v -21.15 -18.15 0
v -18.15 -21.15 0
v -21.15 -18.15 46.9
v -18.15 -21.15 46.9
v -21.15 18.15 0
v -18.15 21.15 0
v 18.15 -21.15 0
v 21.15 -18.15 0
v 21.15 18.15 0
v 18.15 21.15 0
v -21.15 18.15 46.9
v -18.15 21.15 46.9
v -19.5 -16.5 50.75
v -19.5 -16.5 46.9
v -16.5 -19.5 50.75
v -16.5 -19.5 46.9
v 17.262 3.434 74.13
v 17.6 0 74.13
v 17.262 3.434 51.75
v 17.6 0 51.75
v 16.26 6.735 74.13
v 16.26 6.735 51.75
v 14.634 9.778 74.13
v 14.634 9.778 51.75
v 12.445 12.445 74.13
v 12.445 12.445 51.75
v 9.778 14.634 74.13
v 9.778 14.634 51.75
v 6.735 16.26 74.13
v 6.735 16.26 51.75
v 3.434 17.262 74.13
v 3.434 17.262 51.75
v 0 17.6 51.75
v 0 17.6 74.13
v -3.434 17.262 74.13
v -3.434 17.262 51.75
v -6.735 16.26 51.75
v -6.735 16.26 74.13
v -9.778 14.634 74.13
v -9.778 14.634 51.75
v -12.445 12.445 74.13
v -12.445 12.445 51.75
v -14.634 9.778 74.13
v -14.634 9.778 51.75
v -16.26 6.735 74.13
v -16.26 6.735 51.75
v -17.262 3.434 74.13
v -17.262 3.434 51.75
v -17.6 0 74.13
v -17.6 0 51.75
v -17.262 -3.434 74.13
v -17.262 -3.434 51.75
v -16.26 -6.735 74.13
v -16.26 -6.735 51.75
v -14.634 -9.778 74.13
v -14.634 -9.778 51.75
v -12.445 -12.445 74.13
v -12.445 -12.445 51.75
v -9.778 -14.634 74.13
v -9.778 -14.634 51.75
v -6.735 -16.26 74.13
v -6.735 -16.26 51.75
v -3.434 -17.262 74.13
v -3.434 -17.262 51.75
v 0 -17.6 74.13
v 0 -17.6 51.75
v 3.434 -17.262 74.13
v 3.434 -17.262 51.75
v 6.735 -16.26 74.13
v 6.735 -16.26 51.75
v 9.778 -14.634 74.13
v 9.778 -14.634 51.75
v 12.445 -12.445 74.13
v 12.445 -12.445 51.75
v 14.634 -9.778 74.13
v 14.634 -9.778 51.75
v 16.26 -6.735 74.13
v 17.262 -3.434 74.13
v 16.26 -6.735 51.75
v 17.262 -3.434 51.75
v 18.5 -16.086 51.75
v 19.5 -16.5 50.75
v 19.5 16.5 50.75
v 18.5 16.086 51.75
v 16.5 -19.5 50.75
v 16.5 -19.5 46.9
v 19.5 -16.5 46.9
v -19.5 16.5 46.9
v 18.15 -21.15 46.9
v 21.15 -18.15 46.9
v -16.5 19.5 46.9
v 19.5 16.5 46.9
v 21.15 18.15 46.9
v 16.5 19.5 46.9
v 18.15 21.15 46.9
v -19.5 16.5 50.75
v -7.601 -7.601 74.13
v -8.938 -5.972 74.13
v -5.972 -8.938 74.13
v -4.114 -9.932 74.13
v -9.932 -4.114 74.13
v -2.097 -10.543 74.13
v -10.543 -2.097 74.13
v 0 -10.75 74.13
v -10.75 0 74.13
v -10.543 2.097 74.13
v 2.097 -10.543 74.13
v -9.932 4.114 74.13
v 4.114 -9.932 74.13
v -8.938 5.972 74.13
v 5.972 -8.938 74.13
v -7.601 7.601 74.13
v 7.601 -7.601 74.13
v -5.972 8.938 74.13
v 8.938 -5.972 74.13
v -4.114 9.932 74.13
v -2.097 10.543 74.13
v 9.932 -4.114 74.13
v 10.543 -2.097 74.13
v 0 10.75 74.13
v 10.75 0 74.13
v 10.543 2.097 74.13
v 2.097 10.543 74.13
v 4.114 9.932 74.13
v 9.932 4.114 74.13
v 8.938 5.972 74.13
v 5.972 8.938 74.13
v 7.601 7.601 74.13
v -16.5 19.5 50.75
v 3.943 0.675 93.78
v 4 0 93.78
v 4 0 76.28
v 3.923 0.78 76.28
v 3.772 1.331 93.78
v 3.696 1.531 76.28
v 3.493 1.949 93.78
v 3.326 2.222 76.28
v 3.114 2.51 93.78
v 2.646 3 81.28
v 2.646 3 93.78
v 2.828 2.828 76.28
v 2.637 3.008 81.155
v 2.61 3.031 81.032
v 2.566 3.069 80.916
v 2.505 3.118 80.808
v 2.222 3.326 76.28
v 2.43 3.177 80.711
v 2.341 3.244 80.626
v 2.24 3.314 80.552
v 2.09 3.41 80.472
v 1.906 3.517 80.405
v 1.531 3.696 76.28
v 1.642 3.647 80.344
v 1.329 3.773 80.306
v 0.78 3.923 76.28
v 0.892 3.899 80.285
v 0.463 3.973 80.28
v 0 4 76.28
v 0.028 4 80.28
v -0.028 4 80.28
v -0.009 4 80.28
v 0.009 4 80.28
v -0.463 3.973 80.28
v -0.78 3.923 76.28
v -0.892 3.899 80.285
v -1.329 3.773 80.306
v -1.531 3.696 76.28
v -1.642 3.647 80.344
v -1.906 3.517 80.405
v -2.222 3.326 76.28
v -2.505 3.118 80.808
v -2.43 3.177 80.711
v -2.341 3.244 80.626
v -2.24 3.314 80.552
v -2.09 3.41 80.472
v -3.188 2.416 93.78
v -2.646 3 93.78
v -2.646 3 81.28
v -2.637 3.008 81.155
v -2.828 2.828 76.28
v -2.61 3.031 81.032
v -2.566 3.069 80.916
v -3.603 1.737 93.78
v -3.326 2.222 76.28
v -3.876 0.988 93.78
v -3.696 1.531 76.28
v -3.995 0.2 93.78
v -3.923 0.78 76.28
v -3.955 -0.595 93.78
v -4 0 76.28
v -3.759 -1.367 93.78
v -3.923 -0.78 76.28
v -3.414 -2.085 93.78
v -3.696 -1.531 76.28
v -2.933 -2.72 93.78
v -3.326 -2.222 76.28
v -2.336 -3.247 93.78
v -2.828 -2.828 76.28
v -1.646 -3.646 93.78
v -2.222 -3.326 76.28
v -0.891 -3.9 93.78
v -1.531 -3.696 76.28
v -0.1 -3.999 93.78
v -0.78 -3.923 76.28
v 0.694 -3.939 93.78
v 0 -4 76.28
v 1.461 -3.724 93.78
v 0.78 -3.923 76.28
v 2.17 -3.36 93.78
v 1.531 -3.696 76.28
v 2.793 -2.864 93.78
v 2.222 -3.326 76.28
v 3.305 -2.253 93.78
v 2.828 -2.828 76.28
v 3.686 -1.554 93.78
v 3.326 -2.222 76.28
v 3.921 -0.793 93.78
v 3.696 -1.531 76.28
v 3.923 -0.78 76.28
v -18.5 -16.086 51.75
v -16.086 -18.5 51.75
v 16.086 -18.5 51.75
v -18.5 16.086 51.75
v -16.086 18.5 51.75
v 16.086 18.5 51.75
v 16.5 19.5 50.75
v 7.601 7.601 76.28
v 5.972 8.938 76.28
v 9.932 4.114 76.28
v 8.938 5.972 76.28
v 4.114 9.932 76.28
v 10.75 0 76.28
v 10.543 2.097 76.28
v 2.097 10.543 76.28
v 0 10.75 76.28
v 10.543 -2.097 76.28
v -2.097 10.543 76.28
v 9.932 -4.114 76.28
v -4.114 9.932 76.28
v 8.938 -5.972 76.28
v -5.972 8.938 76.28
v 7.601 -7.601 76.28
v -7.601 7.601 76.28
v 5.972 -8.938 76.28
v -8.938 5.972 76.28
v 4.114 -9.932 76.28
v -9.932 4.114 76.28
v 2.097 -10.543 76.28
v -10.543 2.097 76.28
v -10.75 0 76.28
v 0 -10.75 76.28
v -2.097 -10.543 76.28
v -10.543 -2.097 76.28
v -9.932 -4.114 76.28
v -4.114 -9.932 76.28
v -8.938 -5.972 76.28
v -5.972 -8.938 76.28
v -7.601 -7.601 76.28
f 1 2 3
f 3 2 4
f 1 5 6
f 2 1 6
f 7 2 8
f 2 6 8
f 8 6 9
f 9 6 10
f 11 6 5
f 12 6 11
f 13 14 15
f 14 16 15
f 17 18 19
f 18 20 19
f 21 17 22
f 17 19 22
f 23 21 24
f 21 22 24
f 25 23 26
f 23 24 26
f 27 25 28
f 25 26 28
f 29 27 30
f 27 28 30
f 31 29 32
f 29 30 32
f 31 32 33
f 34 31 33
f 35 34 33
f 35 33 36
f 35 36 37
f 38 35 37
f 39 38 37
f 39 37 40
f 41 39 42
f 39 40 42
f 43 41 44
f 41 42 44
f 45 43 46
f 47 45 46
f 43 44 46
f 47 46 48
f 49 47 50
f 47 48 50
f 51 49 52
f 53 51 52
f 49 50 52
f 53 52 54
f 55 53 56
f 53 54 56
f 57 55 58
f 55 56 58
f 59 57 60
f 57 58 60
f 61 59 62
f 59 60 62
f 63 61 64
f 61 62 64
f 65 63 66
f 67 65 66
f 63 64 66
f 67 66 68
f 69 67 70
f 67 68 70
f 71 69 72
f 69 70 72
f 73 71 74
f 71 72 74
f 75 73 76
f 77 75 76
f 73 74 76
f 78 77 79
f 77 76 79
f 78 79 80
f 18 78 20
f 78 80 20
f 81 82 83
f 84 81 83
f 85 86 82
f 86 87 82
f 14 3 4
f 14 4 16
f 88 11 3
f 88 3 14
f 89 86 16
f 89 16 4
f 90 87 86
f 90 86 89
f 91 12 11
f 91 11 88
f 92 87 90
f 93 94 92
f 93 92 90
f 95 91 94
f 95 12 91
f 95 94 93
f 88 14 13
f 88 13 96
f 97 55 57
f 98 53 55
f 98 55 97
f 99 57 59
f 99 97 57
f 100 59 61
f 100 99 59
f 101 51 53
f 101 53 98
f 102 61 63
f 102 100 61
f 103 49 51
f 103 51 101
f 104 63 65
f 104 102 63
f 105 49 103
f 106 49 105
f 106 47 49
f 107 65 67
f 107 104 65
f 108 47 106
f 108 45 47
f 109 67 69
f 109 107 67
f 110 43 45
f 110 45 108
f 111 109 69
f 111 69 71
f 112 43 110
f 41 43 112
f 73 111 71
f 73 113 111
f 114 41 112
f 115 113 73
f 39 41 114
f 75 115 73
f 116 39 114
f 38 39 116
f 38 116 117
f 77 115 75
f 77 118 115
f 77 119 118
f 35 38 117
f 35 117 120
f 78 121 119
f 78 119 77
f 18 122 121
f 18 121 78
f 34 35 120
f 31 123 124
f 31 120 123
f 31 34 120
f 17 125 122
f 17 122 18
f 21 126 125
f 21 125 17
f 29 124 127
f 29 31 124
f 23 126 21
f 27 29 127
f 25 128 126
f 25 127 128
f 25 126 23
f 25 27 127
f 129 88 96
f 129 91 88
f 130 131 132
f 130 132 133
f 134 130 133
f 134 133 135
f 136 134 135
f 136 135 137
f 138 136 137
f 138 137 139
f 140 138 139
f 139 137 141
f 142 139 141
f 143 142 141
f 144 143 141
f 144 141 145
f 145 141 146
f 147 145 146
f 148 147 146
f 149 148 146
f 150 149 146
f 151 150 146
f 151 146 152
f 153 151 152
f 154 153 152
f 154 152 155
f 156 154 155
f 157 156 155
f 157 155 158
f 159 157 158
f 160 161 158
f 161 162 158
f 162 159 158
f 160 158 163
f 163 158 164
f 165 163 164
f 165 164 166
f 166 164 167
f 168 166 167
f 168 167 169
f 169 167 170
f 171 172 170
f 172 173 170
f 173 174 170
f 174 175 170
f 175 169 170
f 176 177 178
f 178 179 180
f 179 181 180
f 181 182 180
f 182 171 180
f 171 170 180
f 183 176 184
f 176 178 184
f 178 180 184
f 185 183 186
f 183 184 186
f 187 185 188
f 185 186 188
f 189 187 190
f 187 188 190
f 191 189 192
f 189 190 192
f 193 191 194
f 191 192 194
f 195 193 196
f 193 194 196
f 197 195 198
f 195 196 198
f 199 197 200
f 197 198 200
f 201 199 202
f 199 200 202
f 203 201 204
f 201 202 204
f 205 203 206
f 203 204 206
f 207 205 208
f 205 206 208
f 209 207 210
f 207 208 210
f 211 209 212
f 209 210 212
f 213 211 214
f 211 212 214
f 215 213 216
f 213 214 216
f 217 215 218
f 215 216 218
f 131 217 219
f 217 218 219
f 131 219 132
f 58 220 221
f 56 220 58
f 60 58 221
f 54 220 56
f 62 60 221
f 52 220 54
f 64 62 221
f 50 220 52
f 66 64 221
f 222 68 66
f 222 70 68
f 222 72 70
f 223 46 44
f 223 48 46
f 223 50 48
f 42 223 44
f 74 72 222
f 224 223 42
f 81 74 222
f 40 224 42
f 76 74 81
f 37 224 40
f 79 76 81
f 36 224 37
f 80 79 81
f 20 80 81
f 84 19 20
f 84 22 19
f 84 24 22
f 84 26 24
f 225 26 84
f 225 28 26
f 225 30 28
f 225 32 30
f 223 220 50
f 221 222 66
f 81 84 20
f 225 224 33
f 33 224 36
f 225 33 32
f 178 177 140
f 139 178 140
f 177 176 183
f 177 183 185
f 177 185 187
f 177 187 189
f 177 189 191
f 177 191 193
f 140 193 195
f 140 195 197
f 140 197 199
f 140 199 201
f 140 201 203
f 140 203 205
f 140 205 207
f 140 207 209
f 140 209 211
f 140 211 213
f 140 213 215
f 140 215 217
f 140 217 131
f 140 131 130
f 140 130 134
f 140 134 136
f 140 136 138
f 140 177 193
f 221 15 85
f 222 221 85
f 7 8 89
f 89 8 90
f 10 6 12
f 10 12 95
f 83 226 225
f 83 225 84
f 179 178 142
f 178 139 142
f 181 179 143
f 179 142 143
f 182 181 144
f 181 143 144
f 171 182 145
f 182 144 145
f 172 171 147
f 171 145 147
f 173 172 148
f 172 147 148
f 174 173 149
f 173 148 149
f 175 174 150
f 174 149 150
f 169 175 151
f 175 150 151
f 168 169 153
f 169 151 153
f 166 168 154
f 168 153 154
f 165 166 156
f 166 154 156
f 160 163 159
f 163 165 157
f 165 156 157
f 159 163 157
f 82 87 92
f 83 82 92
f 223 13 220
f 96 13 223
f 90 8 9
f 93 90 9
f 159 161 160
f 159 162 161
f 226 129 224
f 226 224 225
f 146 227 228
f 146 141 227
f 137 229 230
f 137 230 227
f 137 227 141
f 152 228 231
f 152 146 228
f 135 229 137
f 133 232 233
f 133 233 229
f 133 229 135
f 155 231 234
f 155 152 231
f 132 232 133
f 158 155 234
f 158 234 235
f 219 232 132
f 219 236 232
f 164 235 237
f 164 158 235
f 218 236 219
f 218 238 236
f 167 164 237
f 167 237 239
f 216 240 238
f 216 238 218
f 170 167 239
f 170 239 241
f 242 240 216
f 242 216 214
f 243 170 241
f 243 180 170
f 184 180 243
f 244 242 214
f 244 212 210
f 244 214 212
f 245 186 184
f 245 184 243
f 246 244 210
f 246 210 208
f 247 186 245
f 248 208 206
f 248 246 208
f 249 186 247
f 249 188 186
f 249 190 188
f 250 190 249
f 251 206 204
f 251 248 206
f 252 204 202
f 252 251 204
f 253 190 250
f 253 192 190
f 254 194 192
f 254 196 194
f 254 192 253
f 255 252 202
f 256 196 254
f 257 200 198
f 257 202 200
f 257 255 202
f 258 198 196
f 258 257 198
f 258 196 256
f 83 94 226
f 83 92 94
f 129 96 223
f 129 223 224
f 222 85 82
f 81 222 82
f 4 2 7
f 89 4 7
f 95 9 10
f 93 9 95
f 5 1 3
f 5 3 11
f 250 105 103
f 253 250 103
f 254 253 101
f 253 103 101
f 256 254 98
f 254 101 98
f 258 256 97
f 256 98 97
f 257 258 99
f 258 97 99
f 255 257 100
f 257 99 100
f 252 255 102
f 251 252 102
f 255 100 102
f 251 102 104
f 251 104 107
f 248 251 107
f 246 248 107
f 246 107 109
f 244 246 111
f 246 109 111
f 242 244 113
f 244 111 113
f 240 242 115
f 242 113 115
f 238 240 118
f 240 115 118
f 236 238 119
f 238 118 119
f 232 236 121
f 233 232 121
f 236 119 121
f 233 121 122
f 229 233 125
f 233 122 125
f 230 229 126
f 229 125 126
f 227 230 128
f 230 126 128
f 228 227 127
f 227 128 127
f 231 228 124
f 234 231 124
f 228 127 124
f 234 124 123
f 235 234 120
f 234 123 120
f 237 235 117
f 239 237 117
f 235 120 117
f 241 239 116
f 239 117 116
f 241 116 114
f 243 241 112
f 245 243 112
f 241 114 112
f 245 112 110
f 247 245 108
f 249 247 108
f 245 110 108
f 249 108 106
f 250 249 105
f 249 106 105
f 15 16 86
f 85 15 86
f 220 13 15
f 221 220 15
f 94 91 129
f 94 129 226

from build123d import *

# Parameters (mm, degrees)
SKETCH1_W           = 42.3
SKETCH1_H           = 42.3
BOSS_EXTRUDE1_DEPTH = 46.9
SKETCH2_W           = 39
SKETCH2_H           = 39
BOSS_EXTRUDE2_DEPTH = 4.85
SKETCH3_R           = 17.6
BOSS_EXTRUDE3_DEPTH = 15.88
SKETCH4_R           = 17.6
BOSS_EXTRUDE4_DEPTH = 6.5
SKETCH5_R           = 10.75
BOSS_EXTRUDE5_DEPTH = 2.15
SKETCH6_R           = 4
BOSS_EXTRUDE6_DEPTH = 17.5
CUT_EXTRUDE1_DEPTH  = 13.5
CHAMFER1_SIZE       = 3
CHAMFER2_SIZE       = 1
FILLET1_R           = 1


with BuildPart() as part:
    # Sketch1 → Boss-Extrude1 (new body)
    with BuildSketch(Plane.XY):
        Rectangle(SKETCH1_W, SKETCH1_H)
    extrude(amount=BOSS_EXTRUDE1_DEPTH)

    # Sketch2 → Boss-Extrude2 (add)
    with BuildSketch(Plane.XY.offset(46.9)):
        Rectangle(SKETCH2_W, SKETCH2_H)
    extrude(amount=BOSS_EXTRUDE2_DEPTH)

    # Sketch3 → Boss-Extrude3 (add)
    with BuildSketch(Plane.XY.offset(51.75)):
        Circle(SKETCH3_R)
    extrude(amount=BOSS_EXTRUDE3_DEPTH)

    # Sketch4 → Boss-Extrude4 (add)
    with BuildSketch(Plane.XY.offset(67.63)):
        Circle(SKETCH4_R)
    extrude(amount=BOSS_EXTRUDE4_DEPTH)

    # Sketch5 → Boss-Extrude5 (add)
    with BuildSketch(Plane.XY.offset(74.13)):
        with Locations(Location((0, 0, 0), (0, 0, 180))):
            Circle(SKETCH5_R)
    extrude(amount=BOSS_EXTRUDE5_DEPTH)

    # Sketch6 → Boss-Extrude6 (add)
    with BuildSketch(Plane.XY.offset(76.28)):
        Circle(SKETCH6_R)
    extrude(amount=BOSS_EXTRUDE6_DEPTH)

    # Sketch7 → Cut-Extrude1 (cut)
    with BuildSketch(Plane.XY.offset(93.78)):
        Polygon((-80.453133814, 3), (-2.645751311, 3), (2.645751311, 3), (80.453133814, 3), (80.453133814, 158.614765005), (-80.453133814, 158.614765005), align=None)
    extrude(amount=-CUT_EXTRUDE1_DEPTH, mode=Mode.SUBTRACT)

    # Chamfer1
    chamfer1_edges = [part.edges().sort_by_distance(p)[0] for p in [
        (19.5, -19.5, 49.325),
        (19.5, 19.5, 49.325),
        (-19.5, 19.5, 49.325),
        (-19.5, -19.5, 49.325),
        (-21.15, -21.15, 23.45),
        (21.15, -21.15, 23.45),
        (21.15, 21.15, 23.45),
        (-21.15, 21.15, 23.45),
    ]]
    chamfer(chamfer1_edges, length=CHAMFER1_SIZE)

    # Chamfer2
    chamfer2_edges = [part.edges().sort_by_distance(p)[0] for p in [
        (-19.5, 0, 51.75),
        (0, 19.5, 51.75),
        (19.5, 0, 51.75),
        (0, -19.5, 51.75),
        (18, 18, 51.75),
        (18, -18, 51.75),
        (-18, -18, 51.75),
        (-18, 18, 51.75),
    ]]
    chamfer(chamfer2_edges, length=CHAMFER2_SIZE)

    # Fillet1
    fillet1_edges = [part.edges().sort_by_distance(p)[0] for p in [
        (0, 3, 80.28),
    ]]
    fillet(fillet1_edges, radius=FILLET1_R - 0.0001)  # a hair under: the kernel refuses the full size


solid = part.part
